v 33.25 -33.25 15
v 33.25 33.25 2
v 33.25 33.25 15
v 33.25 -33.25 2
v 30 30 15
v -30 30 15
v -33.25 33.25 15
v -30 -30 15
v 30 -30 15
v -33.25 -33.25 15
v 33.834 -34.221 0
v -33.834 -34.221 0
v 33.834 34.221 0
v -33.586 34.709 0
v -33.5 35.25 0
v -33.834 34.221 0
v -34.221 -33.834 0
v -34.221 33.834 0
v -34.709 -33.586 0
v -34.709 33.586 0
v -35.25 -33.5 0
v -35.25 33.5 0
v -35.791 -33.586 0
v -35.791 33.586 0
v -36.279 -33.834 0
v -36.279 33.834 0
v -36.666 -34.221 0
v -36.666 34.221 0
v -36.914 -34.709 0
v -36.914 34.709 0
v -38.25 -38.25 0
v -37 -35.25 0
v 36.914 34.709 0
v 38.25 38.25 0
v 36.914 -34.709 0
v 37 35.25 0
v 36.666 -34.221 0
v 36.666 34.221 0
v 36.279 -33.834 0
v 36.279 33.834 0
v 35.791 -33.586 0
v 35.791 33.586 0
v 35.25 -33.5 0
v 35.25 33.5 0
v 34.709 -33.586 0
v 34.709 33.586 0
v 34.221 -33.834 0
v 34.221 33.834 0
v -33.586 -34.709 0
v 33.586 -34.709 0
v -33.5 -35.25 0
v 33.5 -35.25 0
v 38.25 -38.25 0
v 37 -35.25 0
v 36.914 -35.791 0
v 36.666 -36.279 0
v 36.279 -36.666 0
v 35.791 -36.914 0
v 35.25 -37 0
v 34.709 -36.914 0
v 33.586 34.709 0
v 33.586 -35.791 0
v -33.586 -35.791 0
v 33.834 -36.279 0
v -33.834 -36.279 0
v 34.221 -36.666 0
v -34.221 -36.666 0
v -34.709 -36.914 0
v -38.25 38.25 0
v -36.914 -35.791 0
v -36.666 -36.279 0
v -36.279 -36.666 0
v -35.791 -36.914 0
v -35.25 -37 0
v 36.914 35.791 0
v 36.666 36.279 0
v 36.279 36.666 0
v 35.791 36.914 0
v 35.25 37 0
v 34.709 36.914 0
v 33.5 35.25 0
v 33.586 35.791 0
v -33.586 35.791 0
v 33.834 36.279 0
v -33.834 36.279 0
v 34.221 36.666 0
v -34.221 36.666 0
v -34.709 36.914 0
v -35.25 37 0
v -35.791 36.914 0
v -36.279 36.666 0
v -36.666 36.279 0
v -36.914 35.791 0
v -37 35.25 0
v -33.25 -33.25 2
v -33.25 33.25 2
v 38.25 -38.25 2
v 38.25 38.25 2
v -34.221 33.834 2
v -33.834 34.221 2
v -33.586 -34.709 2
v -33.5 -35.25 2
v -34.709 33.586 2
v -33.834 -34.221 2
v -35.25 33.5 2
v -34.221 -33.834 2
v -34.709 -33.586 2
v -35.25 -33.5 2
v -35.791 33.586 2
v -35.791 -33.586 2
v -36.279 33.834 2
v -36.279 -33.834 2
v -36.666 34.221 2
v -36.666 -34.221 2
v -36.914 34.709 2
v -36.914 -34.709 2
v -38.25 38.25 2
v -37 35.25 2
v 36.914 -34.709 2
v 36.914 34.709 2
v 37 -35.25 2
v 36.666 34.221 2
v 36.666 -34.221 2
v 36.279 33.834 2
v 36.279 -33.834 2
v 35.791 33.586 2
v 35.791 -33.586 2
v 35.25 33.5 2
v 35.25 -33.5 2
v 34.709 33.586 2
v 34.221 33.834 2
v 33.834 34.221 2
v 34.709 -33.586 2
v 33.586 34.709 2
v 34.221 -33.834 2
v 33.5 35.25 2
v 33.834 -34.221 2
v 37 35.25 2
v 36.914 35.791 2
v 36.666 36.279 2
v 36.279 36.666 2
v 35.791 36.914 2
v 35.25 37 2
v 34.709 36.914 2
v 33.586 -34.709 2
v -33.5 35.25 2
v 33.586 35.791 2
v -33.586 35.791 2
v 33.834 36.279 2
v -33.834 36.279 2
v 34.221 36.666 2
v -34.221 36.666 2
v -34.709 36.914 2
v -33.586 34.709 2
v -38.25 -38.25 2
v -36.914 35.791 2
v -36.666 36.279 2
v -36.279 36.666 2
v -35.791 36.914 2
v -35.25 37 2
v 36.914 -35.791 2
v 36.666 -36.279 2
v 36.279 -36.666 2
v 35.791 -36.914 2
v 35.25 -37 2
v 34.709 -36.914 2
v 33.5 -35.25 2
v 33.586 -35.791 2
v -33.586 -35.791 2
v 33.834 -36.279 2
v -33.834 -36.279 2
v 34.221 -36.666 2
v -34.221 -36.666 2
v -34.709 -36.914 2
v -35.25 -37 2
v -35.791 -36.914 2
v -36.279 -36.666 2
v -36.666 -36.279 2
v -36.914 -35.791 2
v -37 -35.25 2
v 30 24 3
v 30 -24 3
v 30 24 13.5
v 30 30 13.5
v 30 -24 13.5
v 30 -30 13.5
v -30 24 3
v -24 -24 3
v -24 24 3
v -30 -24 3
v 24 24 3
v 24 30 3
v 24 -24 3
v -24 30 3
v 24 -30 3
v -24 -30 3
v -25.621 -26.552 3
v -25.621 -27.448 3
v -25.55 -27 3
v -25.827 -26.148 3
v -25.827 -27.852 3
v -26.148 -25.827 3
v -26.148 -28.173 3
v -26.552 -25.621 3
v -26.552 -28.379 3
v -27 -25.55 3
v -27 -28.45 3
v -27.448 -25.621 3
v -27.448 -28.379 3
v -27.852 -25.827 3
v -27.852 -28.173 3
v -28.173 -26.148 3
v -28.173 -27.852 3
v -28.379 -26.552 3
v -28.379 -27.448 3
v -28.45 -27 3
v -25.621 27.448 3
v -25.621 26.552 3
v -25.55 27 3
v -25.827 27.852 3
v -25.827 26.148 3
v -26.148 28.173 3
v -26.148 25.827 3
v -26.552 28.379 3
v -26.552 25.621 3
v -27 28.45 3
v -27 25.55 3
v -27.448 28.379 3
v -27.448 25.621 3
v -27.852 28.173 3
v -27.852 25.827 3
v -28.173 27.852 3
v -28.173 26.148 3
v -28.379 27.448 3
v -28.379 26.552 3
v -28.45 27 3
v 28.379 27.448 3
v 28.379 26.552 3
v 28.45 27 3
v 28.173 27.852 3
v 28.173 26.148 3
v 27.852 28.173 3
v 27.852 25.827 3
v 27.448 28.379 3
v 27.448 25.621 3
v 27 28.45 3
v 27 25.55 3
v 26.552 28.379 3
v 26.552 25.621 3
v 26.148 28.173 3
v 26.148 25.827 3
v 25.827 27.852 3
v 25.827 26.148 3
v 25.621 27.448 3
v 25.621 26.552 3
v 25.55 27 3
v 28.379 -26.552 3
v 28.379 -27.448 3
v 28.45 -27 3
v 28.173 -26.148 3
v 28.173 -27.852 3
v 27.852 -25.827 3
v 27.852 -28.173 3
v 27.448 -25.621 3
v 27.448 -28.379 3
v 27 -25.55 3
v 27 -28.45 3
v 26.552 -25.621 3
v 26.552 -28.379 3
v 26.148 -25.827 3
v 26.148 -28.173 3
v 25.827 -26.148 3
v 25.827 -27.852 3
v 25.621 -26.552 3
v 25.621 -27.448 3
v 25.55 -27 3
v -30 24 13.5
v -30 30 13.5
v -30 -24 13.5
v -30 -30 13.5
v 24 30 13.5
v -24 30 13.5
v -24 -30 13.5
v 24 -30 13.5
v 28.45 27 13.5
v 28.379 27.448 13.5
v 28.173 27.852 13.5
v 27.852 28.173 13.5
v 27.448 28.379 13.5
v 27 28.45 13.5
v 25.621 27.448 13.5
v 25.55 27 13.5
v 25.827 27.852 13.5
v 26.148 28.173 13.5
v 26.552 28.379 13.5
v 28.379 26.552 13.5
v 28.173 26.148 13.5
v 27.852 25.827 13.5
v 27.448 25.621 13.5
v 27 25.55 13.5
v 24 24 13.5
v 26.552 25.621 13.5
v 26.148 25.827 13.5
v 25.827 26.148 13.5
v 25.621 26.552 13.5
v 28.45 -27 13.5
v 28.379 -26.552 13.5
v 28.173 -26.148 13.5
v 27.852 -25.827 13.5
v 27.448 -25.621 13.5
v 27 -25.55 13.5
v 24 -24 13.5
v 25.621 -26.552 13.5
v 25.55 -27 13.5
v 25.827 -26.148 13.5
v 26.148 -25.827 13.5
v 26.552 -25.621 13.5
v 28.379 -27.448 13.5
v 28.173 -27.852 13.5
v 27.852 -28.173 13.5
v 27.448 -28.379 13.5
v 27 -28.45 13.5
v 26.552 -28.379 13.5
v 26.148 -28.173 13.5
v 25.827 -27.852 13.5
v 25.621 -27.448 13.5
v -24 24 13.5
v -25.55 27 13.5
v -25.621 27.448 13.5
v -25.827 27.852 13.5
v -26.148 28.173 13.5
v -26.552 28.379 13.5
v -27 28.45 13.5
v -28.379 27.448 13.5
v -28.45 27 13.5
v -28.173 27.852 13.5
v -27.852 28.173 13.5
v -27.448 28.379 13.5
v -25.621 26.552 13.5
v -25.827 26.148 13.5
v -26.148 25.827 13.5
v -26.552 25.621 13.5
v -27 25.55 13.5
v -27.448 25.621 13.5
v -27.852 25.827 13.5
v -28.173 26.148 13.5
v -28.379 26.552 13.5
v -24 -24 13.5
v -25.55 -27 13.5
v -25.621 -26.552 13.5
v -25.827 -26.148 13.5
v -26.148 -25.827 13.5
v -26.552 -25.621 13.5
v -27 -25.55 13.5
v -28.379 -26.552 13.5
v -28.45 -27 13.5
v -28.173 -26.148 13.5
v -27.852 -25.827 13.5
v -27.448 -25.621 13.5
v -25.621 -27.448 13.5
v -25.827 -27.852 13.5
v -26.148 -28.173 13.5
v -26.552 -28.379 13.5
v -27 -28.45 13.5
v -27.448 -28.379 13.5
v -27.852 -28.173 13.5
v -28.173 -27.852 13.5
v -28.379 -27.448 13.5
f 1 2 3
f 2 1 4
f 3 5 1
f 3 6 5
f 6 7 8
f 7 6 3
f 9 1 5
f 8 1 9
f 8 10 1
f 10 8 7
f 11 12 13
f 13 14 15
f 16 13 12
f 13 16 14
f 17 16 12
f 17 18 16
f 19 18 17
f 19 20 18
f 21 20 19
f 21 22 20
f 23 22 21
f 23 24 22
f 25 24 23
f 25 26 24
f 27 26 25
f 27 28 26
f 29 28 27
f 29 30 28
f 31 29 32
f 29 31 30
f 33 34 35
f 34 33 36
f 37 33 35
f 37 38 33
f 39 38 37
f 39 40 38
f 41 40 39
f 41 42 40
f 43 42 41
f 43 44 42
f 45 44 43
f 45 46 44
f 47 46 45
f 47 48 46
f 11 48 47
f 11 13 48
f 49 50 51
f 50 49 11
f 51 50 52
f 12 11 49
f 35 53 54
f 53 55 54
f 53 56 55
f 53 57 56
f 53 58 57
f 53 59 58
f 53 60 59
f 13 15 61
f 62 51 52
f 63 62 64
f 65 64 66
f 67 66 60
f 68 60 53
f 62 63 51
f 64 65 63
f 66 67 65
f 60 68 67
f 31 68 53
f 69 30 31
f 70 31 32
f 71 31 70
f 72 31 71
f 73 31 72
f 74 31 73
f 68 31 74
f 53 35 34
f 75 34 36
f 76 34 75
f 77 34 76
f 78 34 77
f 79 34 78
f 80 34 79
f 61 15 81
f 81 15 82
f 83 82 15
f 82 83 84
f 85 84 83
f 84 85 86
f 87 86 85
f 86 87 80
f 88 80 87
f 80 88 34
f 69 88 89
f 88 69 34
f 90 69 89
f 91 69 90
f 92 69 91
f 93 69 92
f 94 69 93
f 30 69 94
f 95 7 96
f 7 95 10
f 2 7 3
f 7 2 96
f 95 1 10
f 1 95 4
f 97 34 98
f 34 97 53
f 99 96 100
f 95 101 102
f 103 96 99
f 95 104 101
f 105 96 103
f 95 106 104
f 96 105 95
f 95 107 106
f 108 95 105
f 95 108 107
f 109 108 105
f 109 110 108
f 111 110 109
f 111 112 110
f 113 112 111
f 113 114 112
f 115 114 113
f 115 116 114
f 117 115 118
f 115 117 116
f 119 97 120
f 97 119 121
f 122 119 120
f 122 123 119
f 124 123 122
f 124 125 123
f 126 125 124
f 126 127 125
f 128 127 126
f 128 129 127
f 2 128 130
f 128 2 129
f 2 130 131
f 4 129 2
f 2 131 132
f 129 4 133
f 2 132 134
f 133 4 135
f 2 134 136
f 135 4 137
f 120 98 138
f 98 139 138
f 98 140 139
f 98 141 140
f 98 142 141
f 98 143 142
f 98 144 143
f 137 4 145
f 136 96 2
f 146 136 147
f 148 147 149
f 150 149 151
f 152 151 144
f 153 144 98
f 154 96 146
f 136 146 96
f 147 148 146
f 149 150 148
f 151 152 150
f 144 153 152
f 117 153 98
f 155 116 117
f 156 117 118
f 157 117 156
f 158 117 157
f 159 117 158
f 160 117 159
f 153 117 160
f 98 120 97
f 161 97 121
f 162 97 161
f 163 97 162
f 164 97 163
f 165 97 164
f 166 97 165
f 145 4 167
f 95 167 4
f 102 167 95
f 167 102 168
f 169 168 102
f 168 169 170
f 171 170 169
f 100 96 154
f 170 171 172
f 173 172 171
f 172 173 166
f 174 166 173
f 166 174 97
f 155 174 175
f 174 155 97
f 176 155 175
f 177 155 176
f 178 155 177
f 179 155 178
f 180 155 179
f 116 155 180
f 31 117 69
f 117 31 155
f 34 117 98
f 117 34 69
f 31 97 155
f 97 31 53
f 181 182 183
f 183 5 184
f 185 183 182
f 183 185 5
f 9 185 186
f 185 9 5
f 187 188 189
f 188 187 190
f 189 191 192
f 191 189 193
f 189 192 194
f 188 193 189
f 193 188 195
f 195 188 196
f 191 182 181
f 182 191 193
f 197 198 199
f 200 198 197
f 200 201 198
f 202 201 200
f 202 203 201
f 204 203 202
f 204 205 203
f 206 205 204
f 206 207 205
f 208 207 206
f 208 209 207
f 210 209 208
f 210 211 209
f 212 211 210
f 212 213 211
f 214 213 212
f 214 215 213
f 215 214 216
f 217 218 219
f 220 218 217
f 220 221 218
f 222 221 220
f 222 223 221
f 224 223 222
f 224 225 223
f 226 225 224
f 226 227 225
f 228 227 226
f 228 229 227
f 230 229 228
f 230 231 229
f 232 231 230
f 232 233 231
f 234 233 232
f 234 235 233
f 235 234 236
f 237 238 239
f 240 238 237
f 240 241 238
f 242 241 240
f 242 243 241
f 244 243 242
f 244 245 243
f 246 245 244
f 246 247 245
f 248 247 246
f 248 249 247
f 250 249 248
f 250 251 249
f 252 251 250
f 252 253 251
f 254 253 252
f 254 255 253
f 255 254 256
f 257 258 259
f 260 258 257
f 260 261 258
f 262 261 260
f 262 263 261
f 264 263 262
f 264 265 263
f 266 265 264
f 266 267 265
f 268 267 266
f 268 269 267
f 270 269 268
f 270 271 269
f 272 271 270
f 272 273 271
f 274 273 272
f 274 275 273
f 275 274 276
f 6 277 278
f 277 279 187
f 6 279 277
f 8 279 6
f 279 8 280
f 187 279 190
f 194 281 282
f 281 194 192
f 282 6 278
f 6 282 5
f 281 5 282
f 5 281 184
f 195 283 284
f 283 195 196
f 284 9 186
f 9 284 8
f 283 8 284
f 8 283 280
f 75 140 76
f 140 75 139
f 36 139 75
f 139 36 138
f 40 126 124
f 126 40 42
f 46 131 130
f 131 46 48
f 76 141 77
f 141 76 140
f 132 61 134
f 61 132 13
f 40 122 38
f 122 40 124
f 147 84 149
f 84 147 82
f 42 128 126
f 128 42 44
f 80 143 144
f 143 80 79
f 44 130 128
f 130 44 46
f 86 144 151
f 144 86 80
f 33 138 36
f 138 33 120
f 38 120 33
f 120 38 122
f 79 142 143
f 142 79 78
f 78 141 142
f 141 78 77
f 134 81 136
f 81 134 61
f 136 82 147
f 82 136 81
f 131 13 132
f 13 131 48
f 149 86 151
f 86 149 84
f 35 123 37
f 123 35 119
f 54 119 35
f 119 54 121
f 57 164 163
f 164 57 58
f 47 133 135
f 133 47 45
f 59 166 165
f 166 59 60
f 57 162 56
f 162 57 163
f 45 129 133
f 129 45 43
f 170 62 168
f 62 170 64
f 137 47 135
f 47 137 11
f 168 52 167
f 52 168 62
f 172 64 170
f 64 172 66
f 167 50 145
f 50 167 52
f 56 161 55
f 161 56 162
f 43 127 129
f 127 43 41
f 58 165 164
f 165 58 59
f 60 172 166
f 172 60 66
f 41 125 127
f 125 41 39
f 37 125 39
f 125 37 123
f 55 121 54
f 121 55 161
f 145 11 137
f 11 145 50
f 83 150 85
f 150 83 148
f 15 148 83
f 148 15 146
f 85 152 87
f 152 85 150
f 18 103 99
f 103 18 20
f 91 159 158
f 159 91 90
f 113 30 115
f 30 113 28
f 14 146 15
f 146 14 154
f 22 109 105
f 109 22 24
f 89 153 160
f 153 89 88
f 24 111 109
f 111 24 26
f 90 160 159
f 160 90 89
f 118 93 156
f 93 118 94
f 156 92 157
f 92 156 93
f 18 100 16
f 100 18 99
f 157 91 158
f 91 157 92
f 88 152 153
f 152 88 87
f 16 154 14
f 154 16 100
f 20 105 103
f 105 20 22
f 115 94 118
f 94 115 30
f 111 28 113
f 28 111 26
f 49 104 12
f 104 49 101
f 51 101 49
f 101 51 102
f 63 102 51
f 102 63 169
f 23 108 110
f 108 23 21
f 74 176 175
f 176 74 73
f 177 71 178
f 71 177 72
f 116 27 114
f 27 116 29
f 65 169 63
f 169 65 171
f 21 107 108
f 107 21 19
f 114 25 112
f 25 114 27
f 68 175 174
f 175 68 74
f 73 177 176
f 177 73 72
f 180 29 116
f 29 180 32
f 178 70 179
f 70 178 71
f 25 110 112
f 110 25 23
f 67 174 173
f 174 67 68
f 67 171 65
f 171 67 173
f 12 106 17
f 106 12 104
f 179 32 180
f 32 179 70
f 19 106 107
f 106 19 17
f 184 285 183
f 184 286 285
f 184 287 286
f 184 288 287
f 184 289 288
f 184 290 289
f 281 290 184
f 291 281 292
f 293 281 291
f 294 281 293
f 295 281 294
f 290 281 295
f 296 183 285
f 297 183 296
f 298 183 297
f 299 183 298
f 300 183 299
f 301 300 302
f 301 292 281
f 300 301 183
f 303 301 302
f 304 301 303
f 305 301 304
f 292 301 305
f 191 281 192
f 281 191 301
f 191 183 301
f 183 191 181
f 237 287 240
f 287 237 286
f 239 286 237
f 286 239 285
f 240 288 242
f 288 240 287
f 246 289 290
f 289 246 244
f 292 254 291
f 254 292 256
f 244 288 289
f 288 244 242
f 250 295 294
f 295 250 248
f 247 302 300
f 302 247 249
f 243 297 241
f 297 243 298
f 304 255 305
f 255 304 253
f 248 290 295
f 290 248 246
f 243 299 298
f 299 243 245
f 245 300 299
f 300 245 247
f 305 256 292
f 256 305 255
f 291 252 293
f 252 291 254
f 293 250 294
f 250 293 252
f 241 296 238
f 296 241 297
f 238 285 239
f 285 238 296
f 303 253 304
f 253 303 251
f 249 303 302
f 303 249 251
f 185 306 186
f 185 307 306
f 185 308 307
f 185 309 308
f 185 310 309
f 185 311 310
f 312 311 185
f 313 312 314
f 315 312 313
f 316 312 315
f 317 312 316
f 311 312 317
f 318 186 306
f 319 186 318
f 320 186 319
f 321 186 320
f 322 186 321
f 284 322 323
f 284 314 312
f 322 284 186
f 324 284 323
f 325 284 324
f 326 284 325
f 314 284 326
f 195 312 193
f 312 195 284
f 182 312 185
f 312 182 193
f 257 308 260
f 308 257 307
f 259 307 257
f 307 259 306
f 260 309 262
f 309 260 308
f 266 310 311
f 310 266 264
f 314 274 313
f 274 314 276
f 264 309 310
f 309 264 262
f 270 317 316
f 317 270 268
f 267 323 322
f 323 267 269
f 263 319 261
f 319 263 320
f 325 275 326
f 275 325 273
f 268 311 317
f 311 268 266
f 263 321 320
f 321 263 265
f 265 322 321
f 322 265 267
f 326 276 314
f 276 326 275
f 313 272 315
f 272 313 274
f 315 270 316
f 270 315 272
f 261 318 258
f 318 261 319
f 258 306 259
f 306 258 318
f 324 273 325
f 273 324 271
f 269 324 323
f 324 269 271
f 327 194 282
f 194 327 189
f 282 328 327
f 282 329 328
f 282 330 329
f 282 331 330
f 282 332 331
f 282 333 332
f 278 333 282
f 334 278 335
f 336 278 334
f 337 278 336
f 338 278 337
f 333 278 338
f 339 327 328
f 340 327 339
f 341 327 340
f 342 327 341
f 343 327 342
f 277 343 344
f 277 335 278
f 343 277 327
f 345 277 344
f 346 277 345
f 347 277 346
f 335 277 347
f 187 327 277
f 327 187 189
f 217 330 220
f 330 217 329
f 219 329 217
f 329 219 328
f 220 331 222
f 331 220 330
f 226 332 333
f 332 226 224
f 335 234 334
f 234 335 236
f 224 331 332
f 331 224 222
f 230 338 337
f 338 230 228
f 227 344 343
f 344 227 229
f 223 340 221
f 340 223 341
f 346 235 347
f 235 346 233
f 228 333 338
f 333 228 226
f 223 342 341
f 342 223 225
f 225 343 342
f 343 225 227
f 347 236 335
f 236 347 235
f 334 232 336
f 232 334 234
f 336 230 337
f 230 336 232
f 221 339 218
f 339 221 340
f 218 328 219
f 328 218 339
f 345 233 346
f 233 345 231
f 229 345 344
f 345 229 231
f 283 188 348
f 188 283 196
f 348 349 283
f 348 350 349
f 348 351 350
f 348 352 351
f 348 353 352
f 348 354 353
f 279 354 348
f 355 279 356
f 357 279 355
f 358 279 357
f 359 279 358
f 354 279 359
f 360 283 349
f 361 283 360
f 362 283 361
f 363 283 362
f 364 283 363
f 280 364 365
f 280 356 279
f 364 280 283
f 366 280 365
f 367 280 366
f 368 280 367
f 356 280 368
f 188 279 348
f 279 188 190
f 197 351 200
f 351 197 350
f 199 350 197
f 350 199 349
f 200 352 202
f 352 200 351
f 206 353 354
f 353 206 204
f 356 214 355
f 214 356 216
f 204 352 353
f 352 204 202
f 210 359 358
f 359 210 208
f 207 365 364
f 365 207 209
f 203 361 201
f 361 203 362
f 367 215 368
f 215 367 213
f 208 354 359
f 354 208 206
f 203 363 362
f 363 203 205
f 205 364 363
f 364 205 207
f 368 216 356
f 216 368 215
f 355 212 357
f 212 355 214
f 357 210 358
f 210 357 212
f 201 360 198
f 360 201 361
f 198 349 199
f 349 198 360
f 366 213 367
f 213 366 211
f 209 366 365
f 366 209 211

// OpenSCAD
/* File: ~/GliderWinchItems/BMS/hw/CantoRibbonBox.scad
  * frame for pc board
  * Latest edit: 20210930
 */
 
 $fn=20;
  
module rounded_rectangle_hull(wid,slen,ht,rad)
{
 hull()
 {    
    translate([-wid/2+rad,rad,0])
        cylinder(r=rad,h=ht,center=false);

   translate([ wid/2-rad,rad,0])
        cylinder(r=rad,h=ht,center=false);

    translate([-wid/2+rad,slen-rad,0])
        cylinder(r=rad,h=ht,center=false);
    
    translate([ wid/2-rad,slen-rad,0])
        cylinder(r=rad,h=ht,center=false);
 }
}
len = 60.5;
wid = 60.5;
ht = 15;
wall = 3;
bot = 3;

psq = 6.0;
pht = ht - 1.5;
phole = 54;

module post(a)
{
    translate(a)
    {
        difference()
        {
            union()
            {
                translate([0,0,pht/2])
                cube([psq,psq,pht],center = true);
            }
            union()
            {
                cylinder(d=2.9,h=100, center=false);
            }
        }
    }
}


module box()
{
    del1 = 2.5;
    difference()
    {
        union()
        {
            translate([0,0,ht/2])
            cube([len+2*wall,wid+2*wall,ht],center = true);
            translate([0,0,2/2])
            cube([len+2*wall+10,wid+2*wall+10,2],center = true);

        }
        union()
        {
            translate([0,0,ht/2+bot])
            cube([len-wall+del1,wid-wall+del1,ht],center = true);
            
            xof = len/2+wall+2;
            translate([ xof, xof,0]) cylinder(d=3.5,h=50,center=true);
            translate([ xof,-xof,0]) cylinder(d=3.5,h=50,center=true);
            translate([-xof, xof,0]) cylinder(d=3.5,h=50,center=true);
            translate([-xof,-xof,0]) cylinder(d=3.5,h=50,center=true);
        }
    }
}
poff = phole/2;
box();
post([ poff, poff,0]);
post([ poff,-poff,0]);
post([-poff, poff,0]);
post([-poff,-poff,0]);
